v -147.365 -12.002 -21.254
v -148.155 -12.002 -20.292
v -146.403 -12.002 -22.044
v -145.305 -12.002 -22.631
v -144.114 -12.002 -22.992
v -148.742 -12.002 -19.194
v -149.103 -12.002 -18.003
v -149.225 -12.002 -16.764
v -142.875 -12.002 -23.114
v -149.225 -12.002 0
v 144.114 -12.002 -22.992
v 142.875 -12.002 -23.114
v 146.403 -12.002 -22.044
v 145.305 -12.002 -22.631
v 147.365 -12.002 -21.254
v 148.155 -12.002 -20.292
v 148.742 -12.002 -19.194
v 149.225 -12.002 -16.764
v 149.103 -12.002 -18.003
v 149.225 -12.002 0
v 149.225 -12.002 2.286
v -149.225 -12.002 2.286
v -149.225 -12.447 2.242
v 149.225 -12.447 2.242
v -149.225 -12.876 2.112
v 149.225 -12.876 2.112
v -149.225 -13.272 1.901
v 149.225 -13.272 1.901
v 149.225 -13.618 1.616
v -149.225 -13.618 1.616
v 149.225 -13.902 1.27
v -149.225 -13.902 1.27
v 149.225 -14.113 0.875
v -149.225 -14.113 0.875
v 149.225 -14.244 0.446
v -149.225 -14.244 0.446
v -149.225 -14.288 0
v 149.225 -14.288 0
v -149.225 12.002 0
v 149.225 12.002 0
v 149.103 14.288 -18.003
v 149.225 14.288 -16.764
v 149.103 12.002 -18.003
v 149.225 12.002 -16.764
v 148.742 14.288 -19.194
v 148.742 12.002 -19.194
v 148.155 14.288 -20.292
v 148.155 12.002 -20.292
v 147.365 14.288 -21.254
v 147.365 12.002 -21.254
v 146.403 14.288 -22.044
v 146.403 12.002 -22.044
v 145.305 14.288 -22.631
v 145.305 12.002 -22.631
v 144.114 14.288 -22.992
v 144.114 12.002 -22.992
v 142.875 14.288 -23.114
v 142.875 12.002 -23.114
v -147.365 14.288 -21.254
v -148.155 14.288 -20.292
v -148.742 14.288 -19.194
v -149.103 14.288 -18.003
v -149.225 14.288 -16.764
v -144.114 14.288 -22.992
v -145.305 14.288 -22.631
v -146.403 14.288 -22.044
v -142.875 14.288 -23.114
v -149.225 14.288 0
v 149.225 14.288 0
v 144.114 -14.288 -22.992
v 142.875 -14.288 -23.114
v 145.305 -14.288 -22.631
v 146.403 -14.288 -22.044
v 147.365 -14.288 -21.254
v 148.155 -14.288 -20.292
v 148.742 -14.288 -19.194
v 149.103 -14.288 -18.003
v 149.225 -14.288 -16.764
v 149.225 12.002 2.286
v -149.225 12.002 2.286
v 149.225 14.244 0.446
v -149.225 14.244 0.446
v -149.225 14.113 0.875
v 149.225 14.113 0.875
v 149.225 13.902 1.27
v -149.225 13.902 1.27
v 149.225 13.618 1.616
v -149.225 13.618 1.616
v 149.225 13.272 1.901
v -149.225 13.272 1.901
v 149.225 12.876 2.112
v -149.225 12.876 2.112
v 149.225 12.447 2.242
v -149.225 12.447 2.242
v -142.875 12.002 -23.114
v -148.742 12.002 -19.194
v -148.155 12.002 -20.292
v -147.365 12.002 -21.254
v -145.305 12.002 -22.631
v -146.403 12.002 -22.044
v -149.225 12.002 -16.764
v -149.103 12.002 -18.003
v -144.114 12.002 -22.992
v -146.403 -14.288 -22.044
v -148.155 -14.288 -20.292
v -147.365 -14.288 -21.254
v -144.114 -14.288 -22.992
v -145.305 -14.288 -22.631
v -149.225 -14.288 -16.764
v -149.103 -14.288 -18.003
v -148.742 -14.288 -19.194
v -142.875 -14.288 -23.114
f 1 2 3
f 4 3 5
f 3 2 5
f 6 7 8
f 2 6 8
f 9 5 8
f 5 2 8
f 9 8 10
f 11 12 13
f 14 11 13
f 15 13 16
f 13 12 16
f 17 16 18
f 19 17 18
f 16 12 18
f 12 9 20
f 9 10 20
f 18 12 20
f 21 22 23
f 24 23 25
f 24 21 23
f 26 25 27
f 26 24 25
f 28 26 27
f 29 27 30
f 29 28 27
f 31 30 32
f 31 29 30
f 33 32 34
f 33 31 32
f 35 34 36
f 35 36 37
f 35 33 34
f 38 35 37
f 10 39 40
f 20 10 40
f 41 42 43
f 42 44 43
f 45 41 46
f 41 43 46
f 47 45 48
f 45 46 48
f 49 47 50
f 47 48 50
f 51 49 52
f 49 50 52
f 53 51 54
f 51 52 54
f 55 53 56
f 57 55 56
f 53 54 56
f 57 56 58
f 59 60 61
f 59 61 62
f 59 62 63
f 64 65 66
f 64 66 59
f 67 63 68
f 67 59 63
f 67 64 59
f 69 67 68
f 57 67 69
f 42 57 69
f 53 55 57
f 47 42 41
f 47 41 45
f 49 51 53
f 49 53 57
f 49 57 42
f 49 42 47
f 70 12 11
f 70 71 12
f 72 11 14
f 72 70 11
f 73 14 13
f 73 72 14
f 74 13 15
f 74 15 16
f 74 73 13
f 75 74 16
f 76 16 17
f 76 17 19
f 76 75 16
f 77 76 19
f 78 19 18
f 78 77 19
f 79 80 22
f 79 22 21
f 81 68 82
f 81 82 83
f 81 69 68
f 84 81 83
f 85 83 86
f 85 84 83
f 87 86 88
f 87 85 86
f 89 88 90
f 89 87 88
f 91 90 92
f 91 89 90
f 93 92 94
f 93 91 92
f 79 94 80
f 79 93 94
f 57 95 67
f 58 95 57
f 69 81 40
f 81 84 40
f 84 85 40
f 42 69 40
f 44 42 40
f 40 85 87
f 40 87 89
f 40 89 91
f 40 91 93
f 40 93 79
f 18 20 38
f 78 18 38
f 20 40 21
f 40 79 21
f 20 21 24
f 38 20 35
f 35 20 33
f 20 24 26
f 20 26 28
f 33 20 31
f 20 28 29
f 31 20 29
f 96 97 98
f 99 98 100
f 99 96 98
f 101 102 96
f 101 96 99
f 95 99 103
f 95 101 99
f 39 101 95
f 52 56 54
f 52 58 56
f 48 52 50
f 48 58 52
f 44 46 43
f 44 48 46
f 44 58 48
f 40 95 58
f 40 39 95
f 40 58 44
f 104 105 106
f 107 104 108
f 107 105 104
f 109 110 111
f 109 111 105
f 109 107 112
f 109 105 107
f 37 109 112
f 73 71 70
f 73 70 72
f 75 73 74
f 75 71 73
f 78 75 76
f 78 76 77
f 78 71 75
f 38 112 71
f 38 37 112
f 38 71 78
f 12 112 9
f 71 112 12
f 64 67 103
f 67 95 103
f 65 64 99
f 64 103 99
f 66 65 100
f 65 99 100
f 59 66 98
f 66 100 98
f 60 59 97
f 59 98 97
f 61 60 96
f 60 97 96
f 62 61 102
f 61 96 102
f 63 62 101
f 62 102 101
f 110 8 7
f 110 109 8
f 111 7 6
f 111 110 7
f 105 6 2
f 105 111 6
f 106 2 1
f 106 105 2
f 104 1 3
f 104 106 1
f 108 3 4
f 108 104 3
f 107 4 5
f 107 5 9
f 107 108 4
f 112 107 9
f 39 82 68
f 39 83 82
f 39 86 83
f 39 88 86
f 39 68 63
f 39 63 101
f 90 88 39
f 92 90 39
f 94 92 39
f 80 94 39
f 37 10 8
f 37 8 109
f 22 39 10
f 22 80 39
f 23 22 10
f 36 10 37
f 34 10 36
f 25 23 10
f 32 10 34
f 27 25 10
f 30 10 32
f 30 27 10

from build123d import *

# Parameters (mm, degrees)
F0_W     = 298.45
F0_H     = 28.575
F1_DEPTH = 2.286
F2_W     = 298.45
F2_H     = 2.286
F3_DEPTH = 23.114
F4_R     = 2.286
F5_R     = 6.35
F6_R     = 6.35
F7_R     = 6.35


with BuildPart() as f1:
    # F0 (on Top) → F1 (new body)
    with BuildSketch(Plane.XY):
        Rectangle(F0_W, F0_H)
    extrude(amount=F1_DEPTH)

    # F2 (on face) → F3 (join)
    with BuildSketch(Plane(origin=(0, 0, 0), x_dir=(1, 0, 0), z_dir=(0, 0, -1))):
        with Locations((0, 13.1445)):
            Rectangle(F2_W, F2_H)
        with Locations((0, -13.1445)):
            Rectangle(F2_W, F2_H)
    extrude(amount=F3_DEPTH)

    # F4
    f4_edges = [f1.edges().sort_by_distance(p)[0] for p in [
        (0, -14.2875, 2.286),
        (0, 14.2875, 2.286),
    ]]
    fillet(f4_edges, radius=F4_R)

    # F5
    f5_edges = [f1.edges().sort_by_distance(p)[0] for p in [
        (149.225, -13.1445, -23.114),
    ]]
    fillet(f5_edges, radius=F5_R)

    # F6
    f6_edges = [f1.edges().sort_by_distance(p)[0] for p in [
        (149.225, 13.1445, -23.114),
    ]]
    fillet(f6_edges, radius=F6_R)

    # F7
    f7_edges = [f1.edges().sort_by_distance(p)[0] for p in [
        (-149.225, -13.1445, -23.114),
        (-149.225, 13.1445, -23.114),
    ]]
    fillet(f7_edges, radius=F7_R)


solid = f1.part
